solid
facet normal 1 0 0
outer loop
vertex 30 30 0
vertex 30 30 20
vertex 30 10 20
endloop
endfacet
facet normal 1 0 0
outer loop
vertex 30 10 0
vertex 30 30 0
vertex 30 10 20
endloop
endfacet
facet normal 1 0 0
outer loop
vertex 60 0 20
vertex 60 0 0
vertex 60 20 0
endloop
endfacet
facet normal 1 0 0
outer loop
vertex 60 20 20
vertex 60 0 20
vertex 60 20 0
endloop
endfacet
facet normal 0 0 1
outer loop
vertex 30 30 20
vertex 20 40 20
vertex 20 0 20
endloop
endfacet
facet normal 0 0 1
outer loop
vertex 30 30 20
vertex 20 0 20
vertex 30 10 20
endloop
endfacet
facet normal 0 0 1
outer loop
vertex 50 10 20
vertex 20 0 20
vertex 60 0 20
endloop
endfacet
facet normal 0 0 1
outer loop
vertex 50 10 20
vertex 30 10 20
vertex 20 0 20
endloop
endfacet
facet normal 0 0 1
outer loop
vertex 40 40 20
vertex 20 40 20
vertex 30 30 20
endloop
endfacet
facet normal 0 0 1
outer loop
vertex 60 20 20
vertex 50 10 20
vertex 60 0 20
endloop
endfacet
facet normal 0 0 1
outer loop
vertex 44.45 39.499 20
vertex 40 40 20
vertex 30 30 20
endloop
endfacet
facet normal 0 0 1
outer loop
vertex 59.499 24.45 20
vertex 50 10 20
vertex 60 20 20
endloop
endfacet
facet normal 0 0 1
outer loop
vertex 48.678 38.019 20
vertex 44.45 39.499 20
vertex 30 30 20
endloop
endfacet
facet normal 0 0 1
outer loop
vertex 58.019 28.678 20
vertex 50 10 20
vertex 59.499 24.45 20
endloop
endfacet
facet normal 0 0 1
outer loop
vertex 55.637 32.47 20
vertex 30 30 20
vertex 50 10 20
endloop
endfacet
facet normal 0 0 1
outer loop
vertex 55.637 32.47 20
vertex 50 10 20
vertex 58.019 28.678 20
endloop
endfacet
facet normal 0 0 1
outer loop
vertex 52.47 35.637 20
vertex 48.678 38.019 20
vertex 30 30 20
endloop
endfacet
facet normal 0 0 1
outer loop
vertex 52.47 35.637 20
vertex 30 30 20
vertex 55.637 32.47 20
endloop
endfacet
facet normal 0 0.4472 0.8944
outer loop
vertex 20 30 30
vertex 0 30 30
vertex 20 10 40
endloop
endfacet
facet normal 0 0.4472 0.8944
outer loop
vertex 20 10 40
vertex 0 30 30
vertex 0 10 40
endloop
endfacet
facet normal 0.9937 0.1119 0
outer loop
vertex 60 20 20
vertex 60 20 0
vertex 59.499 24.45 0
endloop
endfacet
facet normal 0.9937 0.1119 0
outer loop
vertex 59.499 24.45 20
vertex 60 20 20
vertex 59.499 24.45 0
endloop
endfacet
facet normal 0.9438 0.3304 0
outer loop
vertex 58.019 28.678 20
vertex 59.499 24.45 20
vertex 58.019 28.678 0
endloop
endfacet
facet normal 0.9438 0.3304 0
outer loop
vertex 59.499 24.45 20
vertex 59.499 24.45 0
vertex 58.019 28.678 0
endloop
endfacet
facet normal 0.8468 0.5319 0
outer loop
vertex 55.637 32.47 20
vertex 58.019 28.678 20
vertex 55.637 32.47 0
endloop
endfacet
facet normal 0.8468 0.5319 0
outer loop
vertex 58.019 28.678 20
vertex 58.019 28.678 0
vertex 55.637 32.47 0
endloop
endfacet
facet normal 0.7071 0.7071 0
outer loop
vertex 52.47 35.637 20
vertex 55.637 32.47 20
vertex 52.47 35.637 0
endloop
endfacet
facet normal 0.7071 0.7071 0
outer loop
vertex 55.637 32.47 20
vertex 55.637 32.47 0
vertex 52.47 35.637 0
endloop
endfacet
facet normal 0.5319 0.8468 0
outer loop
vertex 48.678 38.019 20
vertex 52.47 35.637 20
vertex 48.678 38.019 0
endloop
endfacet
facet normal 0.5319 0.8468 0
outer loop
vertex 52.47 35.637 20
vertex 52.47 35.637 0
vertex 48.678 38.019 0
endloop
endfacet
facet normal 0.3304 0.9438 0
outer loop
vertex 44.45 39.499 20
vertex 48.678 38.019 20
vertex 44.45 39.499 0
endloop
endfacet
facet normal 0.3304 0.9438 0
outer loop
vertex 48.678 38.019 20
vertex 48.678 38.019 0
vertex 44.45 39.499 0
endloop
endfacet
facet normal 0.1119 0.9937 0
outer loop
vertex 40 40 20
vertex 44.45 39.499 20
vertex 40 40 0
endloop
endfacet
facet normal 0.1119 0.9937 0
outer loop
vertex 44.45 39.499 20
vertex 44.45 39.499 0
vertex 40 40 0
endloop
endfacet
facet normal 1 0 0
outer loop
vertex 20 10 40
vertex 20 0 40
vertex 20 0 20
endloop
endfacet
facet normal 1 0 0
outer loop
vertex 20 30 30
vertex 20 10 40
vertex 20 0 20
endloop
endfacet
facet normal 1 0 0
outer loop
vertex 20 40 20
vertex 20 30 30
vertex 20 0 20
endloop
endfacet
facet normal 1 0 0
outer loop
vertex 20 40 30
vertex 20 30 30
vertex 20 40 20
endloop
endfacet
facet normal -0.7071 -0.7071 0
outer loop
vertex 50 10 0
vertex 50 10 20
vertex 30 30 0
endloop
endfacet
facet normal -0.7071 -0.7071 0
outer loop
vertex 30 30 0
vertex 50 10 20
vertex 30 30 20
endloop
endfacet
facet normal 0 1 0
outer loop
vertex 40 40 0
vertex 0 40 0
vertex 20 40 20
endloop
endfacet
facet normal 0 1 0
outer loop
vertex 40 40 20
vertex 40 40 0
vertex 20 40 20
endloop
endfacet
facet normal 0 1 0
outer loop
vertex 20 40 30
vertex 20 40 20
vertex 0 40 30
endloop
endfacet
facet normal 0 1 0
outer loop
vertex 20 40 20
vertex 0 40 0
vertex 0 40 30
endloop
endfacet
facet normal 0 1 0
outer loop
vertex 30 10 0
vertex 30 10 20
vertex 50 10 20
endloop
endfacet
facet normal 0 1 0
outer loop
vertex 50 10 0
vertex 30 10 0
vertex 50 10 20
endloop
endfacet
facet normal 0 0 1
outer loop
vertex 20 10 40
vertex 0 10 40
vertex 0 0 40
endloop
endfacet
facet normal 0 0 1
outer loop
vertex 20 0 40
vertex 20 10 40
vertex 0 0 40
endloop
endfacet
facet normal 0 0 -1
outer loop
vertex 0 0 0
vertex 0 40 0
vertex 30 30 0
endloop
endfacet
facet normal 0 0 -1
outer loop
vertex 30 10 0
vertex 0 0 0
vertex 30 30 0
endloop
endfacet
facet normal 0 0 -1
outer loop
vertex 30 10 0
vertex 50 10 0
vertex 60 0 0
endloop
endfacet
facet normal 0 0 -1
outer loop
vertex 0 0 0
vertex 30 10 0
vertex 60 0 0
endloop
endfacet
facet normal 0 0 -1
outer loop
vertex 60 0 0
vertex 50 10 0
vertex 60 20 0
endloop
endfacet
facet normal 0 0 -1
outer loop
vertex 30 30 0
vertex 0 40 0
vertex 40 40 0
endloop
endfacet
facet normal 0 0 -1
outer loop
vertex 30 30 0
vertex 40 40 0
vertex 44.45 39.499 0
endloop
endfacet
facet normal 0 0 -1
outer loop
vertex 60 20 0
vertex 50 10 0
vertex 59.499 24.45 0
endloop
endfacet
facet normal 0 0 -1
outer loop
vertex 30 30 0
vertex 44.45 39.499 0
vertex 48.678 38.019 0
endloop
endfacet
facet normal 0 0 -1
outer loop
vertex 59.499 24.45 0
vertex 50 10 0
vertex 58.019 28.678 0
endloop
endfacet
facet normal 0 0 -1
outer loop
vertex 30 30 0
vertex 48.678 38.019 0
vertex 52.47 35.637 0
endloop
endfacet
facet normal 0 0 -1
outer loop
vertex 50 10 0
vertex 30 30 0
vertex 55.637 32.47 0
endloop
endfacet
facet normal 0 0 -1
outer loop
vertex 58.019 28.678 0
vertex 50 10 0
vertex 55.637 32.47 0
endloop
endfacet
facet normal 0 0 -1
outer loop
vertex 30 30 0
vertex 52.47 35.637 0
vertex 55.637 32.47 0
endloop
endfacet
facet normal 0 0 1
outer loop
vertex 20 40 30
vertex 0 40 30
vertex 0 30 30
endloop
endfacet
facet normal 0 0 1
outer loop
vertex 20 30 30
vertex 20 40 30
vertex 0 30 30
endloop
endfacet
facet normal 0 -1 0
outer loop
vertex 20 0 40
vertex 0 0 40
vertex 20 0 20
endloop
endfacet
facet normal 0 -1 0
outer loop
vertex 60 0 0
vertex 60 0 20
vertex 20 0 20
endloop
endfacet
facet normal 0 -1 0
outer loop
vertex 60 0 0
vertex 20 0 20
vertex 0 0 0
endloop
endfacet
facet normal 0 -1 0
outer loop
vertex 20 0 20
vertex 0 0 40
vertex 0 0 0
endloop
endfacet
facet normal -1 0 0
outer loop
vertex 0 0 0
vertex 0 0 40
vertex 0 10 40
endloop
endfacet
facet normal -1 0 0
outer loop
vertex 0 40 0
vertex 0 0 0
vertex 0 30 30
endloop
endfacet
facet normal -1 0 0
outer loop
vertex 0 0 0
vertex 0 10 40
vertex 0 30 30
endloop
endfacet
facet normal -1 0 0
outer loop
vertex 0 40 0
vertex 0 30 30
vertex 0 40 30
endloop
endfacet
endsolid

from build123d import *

# Parameters (mm, degrees)
F1_DEPTH = 20
F3_DEPTH = 20.001
F5_DEPTH = 20


with BuildPart() as f1:
    # F0 (on Top) → F1 (new body)
    with BuildSketch(Plane.XY):
        with BuildLine():
            Line((0, 40), (0, 0))
            Line((0, 0), (60, 0))
            Line((60, 0), (60, 20))
            ThreePointArc((60, 20), (54.142136, 34.142136), (40, 40))
            Line((40, 40), (0, 40))
        make_face()
    extrude(amount=F1_DEPTH)

    # F2 (on face) → F3 (cut, through all)
    with BuildSketch(Plane.XY.offset(20)):
        Polygon((50, 10), (30, 30), (30, 10), align=None)
    extrude(amount=-F3_DEPTH, mode=Mode.SUBTRACT)

    # F4 (on Right) → F5 (join)
    with BuildSketch(Plane.YZ):
        Polygon((0, 40), (0, 20), (40, 20), (40, 30), (30, 30), (10, 40), align=None)
    extrude(amount=F5_DEPTH)


solid = f1.part
